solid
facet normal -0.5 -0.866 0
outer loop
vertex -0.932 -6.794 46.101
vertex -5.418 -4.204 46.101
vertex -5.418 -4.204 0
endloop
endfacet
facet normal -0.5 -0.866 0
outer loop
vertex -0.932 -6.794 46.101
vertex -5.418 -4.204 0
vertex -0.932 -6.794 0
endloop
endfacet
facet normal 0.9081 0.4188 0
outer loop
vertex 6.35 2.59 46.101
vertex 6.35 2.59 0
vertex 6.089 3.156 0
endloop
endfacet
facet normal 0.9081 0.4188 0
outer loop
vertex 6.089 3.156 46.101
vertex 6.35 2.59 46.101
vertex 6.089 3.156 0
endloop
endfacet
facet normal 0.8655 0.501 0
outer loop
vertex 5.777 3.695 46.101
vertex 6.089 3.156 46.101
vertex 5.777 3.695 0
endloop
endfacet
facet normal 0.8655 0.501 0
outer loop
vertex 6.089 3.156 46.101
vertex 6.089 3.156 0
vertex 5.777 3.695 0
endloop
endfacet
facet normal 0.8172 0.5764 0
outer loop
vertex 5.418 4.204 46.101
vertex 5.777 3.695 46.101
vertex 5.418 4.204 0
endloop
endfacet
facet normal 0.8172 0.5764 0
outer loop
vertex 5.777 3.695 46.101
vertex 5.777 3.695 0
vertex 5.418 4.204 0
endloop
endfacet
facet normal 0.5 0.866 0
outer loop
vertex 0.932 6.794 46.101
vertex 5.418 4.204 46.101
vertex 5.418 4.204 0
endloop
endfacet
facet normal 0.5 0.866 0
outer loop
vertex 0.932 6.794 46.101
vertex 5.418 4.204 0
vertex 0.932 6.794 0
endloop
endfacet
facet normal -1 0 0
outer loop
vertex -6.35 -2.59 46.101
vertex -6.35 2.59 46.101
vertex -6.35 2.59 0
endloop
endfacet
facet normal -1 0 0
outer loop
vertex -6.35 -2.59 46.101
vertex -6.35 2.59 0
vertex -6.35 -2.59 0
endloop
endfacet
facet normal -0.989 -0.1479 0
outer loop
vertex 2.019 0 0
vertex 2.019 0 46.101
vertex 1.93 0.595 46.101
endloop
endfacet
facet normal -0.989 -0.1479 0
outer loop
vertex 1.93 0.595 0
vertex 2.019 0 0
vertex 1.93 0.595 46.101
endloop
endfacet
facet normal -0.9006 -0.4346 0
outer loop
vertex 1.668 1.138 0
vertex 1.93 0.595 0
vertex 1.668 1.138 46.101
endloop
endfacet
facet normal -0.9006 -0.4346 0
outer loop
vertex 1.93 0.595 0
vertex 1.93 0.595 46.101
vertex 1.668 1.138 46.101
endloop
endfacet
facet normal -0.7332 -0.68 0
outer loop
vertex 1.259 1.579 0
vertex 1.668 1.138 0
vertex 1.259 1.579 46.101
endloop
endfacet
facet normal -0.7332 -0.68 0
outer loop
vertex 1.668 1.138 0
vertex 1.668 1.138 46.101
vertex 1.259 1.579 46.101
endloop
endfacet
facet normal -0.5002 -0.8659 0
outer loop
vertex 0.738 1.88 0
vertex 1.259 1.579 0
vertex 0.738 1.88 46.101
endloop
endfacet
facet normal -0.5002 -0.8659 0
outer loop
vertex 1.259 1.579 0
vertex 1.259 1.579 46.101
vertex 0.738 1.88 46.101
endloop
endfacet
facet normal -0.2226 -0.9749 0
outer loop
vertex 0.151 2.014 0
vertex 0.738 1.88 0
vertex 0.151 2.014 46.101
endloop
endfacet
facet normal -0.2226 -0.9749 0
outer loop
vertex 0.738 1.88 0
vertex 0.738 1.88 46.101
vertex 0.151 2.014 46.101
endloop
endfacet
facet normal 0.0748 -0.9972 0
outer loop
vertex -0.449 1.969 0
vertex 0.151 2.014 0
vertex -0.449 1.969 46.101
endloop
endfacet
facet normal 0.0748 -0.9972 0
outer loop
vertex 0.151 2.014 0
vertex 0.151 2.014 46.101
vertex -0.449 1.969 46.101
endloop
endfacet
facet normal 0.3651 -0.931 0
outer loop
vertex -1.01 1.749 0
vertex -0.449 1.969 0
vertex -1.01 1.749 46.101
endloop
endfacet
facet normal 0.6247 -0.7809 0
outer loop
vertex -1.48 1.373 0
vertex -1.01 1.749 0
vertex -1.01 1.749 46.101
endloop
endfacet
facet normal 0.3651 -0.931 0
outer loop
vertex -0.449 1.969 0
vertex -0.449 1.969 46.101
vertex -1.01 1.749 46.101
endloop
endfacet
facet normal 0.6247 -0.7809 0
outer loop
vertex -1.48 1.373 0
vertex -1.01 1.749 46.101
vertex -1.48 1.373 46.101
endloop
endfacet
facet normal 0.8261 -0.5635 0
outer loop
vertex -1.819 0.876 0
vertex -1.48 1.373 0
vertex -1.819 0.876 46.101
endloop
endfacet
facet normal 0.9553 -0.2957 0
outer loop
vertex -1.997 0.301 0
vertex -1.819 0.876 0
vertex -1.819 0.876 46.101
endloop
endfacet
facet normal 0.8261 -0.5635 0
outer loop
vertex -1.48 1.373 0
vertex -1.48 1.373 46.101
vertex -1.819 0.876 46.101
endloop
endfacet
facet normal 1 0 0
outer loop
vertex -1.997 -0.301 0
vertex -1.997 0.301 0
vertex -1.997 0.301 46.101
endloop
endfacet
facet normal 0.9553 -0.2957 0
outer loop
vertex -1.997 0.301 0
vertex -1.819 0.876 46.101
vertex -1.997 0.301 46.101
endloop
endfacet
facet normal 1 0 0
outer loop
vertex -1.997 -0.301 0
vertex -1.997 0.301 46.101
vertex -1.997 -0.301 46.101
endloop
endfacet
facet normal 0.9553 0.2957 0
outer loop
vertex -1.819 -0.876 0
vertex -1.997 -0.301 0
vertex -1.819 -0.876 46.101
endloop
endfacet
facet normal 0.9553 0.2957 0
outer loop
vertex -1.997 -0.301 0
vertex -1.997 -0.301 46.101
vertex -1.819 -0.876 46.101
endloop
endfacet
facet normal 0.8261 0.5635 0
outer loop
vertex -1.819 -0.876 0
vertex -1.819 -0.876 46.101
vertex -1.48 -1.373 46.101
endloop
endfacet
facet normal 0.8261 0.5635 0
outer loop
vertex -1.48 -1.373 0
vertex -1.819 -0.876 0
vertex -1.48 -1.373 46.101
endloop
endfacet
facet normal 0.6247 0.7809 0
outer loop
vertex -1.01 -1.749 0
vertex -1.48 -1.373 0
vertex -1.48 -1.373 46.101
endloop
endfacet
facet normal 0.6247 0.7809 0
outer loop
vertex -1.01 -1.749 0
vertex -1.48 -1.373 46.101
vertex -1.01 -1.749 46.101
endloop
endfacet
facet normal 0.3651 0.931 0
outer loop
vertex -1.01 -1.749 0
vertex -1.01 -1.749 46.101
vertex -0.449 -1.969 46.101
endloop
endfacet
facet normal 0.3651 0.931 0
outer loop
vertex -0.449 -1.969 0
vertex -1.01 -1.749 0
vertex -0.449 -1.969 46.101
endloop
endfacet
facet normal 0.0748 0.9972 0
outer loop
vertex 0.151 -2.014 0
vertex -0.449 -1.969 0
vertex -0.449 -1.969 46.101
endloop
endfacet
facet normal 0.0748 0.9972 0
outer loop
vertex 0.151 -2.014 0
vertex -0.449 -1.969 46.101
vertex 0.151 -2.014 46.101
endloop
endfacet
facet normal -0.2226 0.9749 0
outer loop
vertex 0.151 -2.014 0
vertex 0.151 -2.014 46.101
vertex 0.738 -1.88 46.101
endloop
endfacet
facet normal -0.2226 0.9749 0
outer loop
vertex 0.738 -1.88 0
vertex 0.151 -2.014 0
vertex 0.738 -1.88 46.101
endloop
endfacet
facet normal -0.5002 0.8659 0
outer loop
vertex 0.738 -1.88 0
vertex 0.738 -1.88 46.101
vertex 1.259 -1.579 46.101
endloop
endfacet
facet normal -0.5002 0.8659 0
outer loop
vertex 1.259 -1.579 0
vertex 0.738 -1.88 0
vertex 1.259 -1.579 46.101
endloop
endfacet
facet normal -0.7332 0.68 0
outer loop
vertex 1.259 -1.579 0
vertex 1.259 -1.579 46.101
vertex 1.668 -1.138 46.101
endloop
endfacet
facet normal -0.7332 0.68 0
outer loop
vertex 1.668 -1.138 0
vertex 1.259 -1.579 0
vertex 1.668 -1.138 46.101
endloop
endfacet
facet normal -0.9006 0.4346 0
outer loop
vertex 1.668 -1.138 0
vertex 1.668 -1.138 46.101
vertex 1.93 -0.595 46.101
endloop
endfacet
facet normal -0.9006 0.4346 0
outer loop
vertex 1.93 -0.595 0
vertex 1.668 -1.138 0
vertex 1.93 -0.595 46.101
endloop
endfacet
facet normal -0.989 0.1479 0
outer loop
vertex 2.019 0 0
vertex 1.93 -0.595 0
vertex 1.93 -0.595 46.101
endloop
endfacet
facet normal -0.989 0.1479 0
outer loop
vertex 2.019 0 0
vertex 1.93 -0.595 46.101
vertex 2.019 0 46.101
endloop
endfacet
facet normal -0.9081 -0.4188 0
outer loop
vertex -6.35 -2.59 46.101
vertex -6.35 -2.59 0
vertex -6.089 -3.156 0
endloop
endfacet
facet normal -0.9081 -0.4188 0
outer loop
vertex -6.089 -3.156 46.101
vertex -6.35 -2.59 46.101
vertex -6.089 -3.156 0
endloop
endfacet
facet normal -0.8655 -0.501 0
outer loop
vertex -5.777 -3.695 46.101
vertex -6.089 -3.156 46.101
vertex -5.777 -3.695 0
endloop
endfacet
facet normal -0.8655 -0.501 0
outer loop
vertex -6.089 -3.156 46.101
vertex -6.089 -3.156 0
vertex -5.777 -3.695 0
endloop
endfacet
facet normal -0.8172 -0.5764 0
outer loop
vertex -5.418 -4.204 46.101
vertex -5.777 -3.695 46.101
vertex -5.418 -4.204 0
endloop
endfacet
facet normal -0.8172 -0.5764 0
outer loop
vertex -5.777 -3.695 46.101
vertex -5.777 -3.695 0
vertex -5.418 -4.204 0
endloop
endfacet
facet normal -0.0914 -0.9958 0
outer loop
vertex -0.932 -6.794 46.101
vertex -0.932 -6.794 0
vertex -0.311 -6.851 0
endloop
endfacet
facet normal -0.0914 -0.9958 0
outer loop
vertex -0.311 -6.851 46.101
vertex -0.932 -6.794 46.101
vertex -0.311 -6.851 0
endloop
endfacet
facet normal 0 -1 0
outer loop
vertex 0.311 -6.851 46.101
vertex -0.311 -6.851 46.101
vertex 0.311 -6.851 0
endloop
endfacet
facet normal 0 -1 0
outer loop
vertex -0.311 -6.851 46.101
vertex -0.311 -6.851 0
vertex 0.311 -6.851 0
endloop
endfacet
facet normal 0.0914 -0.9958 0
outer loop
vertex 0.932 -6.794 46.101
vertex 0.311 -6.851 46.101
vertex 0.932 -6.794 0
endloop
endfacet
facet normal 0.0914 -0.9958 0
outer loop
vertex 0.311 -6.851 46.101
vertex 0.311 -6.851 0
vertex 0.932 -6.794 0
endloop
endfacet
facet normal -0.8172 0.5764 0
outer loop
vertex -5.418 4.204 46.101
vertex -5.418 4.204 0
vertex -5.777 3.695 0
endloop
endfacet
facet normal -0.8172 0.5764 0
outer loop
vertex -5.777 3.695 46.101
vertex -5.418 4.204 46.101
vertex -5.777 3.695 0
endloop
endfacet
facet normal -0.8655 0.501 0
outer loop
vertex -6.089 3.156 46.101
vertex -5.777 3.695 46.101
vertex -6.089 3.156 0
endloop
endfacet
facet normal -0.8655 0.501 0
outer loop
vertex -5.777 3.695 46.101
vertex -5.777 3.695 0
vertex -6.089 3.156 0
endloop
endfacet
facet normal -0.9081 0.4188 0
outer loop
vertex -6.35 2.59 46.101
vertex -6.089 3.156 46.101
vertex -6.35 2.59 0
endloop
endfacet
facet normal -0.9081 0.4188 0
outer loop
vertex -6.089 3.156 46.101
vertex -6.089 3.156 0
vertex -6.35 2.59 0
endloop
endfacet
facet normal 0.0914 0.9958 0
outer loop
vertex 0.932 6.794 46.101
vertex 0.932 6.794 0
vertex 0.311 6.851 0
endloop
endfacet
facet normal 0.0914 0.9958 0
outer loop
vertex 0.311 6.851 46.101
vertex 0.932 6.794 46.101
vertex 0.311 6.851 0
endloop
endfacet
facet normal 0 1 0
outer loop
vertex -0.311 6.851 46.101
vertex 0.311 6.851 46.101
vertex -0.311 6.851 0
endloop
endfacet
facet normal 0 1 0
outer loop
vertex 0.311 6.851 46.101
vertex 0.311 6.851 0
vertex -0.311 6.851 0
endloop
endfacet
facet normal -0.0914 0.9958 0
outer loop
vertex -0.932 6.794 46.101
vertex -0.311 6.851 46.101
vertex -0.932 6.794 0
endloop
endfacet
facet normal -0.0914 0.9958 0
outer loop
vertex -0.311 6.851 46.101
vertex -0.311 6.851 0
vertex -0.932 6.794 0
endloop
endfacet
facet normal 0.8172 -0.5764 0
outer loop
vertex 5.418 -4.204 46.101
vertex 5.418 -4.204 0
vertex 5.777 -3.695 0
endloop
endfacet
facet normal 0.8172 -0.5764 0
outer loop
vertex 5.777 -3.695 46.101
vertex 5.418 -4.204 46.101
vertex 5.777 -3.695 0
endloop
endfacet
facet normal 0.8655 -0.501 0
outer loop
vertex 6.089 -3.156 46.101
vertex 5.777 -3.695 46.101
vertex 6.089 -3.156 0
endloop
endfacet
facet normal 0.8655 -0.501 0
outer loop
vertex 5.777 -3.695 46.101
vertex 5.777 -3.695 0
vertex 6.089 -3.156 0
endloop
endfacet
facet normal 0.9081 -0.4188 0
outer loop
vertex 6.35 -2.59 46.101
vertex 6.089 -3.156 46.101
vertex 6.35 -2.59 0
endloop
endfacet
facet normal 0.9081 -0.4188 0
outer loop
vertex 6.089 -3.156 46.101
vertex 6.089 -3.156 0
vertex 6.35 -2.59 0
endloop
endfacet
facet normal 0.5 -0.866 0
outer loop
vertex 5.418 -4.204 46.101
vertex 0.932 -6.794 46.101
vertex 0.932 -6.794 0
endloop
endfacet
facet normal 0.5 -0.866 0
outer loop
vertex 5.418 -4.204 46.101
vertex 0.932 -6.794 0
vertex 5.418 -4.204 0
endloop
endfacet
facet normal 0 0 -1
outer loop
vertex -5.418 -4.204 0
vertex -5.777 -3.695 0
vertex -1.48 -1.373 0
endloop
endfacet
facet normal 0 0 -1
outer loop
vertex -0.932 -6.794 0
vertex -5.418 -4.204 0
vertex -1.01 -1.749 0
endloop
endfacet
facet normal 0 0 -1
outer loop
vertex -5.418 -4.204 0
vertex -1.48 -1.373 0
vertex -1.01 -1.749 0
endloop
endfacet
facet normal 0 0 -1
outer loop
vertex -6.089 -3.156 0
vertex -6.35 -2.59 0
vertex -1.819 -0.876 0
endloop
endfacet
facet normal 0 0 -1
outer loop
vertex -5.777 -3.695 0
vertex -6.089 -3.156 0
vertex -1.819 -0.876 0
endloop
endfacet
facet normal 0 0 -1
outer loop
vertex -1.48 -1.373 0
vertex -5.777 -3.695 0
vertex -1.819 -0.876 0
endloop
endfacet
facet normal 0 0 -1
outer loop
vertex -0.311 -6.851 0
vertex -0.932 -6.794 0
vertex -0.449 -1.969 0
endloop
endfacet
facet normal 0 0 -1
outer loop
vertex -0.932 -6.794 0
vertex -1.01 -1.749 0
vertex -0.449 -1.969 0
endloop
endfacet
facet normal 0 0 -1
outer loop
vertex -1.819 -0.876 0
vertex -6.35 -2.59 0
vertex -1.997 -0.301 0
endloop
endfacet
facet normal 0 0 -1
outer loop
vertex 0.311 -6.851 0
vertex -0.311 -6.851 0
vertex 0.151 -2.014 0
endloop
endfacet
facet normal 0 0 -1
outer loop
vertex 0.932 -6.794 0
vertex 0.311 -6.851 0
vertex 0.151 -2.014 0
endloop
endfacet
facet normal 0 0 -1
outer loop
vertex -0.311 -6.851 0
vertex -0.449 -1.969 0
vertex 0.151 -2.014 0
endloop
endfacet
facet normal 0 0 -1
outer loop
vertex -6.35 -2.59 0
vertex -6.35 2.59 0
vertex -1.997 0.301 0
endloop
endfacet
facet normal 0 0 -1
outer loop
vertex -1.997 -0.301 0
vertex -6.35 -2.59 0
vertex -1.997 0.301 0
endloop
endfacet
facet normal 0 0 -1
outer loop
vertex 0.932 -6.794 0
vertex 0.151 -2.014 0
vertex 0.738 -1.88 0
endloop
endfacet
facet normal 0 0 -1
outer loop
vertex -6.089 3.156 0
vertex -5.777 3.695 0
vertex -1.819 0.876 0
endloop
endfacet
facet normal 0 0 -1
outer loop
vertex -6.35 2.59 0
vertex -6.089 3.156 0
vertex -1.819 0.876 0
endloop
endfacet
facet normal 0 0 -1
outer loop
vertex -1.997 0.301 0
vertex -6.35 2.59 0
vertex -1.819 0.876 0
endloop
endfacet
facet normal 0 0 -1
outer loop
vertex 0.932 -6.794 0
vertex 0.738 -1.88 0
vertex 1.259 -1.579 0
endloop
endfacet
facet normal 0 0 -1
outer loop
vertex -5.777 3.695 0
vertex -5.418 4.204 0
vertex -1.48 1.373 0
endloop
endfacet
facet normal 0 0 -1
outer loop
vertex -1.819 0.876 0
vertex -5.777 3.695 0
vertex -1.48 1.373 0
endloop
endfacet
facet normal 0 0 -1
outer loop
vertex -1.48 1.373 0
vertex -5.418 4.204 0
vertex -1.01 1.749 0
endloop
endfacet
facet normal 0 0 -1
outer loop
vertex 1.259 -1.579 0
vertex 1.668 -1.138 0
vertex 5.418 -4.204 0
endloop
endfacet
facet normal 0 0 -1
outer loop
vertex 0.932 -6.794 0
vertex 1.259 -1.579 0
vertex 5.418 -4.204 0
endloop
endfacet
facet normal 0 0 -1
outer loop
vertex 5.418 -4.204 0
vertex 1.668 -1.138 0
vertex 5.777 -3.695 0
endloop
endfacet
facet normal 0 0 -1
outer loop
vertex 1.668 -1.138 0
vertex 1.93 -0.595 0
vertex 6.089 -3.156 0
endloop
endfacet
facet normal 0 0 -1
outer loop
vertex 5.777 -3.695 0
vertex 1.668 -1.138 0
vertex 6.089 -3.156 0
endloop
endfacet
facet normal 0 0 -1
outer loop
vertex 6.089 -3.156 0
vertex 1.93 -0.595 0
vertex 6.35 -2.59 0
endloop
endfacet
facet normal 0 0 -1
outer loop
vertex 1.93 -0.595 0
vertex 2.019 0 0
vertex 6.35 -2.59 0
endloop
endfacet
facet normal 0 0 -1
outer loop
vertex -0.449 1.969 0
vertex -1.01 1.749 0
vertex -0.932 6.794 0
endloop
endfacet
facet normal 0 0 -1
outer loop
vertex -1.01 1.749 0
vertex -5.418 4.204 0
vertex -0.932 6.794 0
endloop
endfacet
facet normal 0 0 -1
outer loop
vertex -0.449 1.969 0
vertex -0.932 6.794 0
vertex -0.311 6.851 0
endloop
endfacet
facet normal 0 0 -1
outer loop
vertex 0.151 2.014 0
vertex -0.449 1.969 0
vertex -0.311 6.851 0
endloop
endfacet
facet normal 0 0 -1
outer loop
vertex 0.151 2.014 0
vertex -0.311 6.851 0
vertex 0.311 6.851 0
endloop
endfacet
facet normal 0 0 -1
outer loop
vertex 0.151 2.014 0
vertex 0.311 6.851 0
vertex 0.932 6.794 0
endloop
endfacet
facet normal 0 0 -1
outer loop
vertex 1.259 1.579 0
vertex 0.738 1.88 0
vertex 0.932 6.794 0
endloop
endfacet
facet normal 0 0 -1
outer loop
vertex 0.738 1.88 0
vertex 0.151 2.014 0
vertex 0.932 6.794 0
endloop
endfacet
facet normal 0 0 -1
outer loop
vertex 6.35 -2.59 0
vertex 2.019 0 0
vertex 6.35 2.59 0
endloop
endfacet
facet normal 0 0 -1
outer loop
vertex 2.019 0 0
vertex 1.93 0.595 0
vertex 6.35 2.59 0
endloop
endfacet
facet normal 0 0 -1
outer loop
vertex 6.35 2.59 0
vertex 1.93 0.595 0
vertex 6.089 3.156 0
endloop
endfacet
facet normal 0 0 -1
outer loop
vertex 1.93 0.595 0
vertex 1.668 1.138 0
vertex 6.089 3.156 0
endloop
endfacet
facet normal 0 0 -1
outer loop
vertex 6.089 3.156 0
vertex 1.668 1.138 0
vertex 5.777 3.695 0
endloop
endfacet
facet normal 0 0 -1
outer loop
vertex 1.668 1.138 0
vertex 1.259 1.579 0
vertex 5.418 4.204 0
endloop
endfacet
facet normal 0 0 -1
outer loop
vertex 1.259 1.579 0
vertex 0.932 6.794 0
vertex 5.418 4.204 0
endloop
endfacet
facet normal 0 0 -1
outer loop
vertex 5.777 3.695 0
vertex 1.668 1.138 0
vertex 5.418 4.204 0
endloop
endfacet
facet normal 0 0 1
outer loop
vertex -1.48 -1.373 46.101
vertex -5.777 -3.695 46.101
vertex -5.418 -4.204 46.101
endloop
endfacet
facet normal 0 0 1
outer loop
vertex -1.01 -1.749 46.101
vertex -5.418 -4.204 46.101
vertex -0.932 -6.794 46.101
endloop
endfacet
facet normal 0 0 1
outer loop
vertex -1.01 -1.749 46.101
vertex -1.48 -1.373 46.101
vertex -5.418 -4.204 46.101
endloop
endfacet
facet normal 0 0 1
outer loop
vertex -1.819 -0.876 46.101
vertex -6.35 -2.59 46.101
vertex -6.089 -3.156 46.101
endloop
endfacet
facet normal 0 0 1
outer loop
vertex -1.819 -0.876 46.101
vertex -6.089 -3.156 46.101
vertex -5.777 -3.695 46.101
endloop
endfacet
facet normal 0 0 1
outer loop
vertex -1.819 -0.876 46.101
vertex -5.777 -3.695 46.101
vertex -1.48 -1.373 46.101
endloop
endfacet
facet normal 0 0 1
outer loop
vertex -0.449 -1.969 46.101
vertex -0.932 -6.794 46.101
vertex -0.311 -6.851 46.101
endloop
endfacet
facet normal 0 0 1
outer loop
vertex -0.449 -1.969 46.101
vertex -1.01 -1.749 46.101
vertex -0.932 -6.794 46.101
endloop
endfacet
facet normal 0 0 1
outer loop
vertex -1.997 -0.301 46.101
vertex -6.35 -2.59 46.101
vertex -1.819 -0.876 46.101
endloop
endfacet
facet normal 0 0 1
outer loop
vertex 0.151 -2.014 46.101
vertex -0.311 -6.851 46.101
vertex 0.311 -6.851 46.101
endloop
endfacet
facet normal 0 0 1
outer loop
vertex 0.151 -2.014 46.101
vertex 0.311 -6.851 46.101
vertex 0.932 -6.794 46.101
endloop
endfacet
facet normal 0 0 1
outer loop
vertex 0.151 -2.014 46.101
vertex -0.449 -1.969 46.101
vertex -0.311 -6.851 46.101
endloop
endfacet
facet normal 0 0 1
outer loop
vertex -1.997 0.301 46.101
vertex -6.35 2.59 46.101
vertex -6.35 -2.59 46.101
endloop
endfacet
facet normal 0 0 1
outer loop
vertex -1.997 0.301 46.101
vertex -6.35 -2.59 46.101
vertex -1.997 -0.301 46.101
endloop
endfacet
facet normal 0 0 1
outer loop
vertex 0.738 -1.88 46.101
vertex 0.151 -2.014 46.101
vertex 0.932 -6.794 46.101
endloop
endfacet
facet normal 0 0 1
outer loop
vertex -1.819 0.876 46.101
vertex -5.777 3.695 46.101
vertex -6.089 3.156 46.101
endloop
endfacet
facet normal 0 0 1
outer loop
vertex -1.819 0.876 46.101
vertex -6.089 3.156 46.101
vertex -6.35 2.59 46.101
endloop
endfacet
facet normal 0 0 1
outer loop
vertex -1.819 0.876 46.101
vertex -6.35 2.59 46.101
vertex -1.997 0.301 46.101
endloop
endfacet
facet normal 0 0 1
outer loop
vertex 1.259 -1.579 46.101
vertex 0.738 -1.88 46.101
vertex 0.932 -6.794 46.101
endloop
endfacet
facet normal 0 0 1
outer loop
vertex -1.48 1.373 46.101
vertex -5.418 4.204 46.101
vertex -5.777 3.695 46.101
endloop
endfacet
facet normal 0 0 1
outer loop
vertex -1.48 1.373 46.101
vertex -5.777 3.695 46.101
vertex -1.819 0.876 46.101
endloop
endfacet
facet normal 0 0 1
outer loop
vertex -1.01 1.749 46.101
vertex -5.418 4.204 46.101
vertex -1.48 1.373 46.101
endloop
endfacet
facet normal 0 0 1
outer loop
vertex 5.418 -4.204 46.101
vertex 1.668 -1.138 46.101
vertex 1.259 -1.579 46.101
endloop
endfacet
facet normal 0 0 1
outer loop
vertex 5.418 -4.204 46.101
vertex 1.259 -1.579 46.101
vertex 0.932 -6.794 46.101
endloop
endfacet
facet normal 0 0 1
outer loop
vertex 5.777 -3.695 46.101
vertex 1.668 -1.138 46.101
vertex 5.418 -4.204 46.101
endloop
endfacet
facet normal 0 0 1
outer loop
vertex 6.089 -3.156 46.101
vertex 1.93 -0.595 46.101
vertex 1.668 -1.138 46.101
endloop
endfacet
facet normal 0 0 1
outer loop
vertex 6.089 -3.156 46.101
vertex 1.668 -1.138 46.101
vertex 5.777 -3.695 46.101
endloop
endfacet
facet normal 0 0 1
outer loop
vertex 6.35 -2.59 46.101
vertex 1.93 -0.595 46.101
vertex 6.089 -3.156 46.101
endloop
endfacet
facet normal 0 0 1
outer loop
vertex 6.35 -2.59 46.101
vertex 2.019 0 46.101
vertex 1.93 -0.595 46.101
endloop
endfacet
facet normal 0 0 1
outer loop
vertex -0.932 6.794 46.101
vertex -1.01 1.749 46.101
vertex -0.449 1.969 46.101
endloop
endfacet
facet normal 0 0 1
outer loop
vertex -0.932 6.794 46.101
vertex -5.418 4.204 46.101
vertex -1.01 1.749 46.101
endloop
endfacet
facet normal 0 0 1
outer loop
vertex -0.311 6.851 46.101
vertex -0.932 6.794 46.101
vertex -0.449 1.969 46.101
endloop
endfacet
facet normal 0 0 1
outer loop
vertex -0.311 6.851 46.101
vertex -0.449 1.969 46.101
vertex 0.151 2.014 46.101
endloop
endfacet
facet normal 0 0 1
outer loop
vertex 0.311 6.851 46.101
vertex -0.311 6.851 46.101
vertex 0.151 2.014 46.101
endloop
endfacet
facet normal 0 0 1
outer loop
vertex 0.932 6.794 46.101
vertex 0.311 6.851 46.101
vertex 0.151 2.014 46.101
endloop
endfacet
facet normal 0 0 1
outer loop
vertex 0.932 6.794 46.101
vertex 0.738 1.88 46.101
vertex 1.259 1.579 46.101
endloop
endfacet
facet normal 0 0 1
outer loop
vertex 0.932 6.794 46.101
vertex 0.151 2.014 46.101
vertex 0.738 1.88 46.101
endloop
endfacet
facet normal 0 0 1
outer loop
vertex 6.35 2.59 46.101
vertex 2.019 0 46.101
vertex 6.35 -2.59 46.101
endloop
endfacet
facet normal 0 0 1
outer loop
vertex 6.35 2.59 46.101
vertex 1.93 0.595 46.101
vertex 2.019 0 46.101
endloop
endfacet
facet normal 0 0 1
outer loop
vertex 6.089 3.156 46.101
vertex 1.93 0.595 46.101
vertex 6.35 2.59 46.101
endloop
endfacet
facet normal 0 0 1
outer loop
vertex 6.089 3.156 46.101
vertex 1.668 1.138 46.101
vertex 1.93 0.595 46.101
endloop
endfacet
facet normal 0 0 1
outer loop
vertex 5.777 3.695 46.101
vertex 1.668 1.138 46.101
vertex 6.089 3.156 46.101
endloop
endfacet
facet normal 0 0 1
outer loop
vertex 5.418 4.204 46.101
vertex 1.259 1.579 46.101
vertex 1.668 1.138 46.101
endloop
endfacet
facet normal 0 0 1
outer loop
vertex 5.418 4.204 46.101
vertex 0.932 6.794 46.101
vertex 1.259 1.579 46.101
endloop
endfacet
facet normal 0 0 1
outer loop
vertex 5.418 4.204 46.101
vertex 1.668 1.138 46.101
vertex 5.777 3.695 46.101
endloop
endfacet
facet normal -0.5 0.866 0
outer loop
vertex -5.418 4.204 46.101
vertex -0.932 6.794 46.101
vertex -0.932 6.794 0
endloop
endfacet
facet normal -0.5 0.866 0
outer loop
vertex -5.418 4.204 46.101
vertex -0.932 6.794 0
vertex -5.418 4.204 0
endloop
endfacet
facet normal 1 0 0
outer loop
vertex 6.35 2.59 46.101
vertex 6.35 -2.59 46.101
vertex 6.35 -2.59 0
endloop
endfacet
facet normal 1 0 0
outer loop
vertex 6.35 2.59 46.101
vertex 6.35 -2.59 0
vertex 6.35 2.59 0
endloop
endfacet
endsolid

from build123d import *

# Parameters (mm, degrees)
BOSS_EXTRUDE1_DEPTH = 46.101
SKETCH2_R           = 2.0193
CUT_EXTRUDE1_DEPTH  = 48.038886732


with BuildPart() as part:
    # Sketch1 → Boss-Extrude1 (new body)
    with BuildSketch(Plane.XY):
        with BuildLine():
            Line((-0.93173274, 6.79441227), (-5.41826726, 4.204110358))
            ThreePointArc((-5.41826726, 4.204110358), (-5.939202219, 3.429), (-6.35, 2.590301913))
            Line((-6.35, 2.590301913), (-6.35, -2.590301913))
            ThreePointArc((-6.35, -2.590301913), (-5.939202219, -3.429), (-5.41826726, -4.204110358))
            Line((-5.41826726, -4.204110358), (-0.93173274, -6.79441227))
            ThreePointArc((-0.93173274, -6.79441227), (0, -6.858), (0.93173274, -6.79441227))
            Line((0.93173274, -6.79441227), (5.41826726, -4.204110358))
            ThreePointArc((5.41826726, -4.204110358), (5.939202219, -3.429), (6.35, -2.590301913))
            Line((6.35, -2.590301913), (6.35, 2.590301913))
            ThreePointArc((6.35, 2.590301913), (5.939202219, 3.429), (5.41826726, 4.204110358))
            Line((5.41826726, 4.204110358), (0.93173274, 6.79441227))
            ThreePointArc((0.93173274, 6.79441227), (0, 6.858), (-0.93173274, 6.79441227))
        make_face()
    extrude(amount=BOSS_EXTRUDE1_DEPTH)

    # Sketch2 → Cut-Extrude1 (cut, through all)
    with BuildSketch(Plane.XY.offset(46.101)):
        Circle(SKETCH2_R)
    extrude(amount=-CUT_EXTRUDE1_DEPTH, mode=Mode.SUBTRACT)


solid = part.part
